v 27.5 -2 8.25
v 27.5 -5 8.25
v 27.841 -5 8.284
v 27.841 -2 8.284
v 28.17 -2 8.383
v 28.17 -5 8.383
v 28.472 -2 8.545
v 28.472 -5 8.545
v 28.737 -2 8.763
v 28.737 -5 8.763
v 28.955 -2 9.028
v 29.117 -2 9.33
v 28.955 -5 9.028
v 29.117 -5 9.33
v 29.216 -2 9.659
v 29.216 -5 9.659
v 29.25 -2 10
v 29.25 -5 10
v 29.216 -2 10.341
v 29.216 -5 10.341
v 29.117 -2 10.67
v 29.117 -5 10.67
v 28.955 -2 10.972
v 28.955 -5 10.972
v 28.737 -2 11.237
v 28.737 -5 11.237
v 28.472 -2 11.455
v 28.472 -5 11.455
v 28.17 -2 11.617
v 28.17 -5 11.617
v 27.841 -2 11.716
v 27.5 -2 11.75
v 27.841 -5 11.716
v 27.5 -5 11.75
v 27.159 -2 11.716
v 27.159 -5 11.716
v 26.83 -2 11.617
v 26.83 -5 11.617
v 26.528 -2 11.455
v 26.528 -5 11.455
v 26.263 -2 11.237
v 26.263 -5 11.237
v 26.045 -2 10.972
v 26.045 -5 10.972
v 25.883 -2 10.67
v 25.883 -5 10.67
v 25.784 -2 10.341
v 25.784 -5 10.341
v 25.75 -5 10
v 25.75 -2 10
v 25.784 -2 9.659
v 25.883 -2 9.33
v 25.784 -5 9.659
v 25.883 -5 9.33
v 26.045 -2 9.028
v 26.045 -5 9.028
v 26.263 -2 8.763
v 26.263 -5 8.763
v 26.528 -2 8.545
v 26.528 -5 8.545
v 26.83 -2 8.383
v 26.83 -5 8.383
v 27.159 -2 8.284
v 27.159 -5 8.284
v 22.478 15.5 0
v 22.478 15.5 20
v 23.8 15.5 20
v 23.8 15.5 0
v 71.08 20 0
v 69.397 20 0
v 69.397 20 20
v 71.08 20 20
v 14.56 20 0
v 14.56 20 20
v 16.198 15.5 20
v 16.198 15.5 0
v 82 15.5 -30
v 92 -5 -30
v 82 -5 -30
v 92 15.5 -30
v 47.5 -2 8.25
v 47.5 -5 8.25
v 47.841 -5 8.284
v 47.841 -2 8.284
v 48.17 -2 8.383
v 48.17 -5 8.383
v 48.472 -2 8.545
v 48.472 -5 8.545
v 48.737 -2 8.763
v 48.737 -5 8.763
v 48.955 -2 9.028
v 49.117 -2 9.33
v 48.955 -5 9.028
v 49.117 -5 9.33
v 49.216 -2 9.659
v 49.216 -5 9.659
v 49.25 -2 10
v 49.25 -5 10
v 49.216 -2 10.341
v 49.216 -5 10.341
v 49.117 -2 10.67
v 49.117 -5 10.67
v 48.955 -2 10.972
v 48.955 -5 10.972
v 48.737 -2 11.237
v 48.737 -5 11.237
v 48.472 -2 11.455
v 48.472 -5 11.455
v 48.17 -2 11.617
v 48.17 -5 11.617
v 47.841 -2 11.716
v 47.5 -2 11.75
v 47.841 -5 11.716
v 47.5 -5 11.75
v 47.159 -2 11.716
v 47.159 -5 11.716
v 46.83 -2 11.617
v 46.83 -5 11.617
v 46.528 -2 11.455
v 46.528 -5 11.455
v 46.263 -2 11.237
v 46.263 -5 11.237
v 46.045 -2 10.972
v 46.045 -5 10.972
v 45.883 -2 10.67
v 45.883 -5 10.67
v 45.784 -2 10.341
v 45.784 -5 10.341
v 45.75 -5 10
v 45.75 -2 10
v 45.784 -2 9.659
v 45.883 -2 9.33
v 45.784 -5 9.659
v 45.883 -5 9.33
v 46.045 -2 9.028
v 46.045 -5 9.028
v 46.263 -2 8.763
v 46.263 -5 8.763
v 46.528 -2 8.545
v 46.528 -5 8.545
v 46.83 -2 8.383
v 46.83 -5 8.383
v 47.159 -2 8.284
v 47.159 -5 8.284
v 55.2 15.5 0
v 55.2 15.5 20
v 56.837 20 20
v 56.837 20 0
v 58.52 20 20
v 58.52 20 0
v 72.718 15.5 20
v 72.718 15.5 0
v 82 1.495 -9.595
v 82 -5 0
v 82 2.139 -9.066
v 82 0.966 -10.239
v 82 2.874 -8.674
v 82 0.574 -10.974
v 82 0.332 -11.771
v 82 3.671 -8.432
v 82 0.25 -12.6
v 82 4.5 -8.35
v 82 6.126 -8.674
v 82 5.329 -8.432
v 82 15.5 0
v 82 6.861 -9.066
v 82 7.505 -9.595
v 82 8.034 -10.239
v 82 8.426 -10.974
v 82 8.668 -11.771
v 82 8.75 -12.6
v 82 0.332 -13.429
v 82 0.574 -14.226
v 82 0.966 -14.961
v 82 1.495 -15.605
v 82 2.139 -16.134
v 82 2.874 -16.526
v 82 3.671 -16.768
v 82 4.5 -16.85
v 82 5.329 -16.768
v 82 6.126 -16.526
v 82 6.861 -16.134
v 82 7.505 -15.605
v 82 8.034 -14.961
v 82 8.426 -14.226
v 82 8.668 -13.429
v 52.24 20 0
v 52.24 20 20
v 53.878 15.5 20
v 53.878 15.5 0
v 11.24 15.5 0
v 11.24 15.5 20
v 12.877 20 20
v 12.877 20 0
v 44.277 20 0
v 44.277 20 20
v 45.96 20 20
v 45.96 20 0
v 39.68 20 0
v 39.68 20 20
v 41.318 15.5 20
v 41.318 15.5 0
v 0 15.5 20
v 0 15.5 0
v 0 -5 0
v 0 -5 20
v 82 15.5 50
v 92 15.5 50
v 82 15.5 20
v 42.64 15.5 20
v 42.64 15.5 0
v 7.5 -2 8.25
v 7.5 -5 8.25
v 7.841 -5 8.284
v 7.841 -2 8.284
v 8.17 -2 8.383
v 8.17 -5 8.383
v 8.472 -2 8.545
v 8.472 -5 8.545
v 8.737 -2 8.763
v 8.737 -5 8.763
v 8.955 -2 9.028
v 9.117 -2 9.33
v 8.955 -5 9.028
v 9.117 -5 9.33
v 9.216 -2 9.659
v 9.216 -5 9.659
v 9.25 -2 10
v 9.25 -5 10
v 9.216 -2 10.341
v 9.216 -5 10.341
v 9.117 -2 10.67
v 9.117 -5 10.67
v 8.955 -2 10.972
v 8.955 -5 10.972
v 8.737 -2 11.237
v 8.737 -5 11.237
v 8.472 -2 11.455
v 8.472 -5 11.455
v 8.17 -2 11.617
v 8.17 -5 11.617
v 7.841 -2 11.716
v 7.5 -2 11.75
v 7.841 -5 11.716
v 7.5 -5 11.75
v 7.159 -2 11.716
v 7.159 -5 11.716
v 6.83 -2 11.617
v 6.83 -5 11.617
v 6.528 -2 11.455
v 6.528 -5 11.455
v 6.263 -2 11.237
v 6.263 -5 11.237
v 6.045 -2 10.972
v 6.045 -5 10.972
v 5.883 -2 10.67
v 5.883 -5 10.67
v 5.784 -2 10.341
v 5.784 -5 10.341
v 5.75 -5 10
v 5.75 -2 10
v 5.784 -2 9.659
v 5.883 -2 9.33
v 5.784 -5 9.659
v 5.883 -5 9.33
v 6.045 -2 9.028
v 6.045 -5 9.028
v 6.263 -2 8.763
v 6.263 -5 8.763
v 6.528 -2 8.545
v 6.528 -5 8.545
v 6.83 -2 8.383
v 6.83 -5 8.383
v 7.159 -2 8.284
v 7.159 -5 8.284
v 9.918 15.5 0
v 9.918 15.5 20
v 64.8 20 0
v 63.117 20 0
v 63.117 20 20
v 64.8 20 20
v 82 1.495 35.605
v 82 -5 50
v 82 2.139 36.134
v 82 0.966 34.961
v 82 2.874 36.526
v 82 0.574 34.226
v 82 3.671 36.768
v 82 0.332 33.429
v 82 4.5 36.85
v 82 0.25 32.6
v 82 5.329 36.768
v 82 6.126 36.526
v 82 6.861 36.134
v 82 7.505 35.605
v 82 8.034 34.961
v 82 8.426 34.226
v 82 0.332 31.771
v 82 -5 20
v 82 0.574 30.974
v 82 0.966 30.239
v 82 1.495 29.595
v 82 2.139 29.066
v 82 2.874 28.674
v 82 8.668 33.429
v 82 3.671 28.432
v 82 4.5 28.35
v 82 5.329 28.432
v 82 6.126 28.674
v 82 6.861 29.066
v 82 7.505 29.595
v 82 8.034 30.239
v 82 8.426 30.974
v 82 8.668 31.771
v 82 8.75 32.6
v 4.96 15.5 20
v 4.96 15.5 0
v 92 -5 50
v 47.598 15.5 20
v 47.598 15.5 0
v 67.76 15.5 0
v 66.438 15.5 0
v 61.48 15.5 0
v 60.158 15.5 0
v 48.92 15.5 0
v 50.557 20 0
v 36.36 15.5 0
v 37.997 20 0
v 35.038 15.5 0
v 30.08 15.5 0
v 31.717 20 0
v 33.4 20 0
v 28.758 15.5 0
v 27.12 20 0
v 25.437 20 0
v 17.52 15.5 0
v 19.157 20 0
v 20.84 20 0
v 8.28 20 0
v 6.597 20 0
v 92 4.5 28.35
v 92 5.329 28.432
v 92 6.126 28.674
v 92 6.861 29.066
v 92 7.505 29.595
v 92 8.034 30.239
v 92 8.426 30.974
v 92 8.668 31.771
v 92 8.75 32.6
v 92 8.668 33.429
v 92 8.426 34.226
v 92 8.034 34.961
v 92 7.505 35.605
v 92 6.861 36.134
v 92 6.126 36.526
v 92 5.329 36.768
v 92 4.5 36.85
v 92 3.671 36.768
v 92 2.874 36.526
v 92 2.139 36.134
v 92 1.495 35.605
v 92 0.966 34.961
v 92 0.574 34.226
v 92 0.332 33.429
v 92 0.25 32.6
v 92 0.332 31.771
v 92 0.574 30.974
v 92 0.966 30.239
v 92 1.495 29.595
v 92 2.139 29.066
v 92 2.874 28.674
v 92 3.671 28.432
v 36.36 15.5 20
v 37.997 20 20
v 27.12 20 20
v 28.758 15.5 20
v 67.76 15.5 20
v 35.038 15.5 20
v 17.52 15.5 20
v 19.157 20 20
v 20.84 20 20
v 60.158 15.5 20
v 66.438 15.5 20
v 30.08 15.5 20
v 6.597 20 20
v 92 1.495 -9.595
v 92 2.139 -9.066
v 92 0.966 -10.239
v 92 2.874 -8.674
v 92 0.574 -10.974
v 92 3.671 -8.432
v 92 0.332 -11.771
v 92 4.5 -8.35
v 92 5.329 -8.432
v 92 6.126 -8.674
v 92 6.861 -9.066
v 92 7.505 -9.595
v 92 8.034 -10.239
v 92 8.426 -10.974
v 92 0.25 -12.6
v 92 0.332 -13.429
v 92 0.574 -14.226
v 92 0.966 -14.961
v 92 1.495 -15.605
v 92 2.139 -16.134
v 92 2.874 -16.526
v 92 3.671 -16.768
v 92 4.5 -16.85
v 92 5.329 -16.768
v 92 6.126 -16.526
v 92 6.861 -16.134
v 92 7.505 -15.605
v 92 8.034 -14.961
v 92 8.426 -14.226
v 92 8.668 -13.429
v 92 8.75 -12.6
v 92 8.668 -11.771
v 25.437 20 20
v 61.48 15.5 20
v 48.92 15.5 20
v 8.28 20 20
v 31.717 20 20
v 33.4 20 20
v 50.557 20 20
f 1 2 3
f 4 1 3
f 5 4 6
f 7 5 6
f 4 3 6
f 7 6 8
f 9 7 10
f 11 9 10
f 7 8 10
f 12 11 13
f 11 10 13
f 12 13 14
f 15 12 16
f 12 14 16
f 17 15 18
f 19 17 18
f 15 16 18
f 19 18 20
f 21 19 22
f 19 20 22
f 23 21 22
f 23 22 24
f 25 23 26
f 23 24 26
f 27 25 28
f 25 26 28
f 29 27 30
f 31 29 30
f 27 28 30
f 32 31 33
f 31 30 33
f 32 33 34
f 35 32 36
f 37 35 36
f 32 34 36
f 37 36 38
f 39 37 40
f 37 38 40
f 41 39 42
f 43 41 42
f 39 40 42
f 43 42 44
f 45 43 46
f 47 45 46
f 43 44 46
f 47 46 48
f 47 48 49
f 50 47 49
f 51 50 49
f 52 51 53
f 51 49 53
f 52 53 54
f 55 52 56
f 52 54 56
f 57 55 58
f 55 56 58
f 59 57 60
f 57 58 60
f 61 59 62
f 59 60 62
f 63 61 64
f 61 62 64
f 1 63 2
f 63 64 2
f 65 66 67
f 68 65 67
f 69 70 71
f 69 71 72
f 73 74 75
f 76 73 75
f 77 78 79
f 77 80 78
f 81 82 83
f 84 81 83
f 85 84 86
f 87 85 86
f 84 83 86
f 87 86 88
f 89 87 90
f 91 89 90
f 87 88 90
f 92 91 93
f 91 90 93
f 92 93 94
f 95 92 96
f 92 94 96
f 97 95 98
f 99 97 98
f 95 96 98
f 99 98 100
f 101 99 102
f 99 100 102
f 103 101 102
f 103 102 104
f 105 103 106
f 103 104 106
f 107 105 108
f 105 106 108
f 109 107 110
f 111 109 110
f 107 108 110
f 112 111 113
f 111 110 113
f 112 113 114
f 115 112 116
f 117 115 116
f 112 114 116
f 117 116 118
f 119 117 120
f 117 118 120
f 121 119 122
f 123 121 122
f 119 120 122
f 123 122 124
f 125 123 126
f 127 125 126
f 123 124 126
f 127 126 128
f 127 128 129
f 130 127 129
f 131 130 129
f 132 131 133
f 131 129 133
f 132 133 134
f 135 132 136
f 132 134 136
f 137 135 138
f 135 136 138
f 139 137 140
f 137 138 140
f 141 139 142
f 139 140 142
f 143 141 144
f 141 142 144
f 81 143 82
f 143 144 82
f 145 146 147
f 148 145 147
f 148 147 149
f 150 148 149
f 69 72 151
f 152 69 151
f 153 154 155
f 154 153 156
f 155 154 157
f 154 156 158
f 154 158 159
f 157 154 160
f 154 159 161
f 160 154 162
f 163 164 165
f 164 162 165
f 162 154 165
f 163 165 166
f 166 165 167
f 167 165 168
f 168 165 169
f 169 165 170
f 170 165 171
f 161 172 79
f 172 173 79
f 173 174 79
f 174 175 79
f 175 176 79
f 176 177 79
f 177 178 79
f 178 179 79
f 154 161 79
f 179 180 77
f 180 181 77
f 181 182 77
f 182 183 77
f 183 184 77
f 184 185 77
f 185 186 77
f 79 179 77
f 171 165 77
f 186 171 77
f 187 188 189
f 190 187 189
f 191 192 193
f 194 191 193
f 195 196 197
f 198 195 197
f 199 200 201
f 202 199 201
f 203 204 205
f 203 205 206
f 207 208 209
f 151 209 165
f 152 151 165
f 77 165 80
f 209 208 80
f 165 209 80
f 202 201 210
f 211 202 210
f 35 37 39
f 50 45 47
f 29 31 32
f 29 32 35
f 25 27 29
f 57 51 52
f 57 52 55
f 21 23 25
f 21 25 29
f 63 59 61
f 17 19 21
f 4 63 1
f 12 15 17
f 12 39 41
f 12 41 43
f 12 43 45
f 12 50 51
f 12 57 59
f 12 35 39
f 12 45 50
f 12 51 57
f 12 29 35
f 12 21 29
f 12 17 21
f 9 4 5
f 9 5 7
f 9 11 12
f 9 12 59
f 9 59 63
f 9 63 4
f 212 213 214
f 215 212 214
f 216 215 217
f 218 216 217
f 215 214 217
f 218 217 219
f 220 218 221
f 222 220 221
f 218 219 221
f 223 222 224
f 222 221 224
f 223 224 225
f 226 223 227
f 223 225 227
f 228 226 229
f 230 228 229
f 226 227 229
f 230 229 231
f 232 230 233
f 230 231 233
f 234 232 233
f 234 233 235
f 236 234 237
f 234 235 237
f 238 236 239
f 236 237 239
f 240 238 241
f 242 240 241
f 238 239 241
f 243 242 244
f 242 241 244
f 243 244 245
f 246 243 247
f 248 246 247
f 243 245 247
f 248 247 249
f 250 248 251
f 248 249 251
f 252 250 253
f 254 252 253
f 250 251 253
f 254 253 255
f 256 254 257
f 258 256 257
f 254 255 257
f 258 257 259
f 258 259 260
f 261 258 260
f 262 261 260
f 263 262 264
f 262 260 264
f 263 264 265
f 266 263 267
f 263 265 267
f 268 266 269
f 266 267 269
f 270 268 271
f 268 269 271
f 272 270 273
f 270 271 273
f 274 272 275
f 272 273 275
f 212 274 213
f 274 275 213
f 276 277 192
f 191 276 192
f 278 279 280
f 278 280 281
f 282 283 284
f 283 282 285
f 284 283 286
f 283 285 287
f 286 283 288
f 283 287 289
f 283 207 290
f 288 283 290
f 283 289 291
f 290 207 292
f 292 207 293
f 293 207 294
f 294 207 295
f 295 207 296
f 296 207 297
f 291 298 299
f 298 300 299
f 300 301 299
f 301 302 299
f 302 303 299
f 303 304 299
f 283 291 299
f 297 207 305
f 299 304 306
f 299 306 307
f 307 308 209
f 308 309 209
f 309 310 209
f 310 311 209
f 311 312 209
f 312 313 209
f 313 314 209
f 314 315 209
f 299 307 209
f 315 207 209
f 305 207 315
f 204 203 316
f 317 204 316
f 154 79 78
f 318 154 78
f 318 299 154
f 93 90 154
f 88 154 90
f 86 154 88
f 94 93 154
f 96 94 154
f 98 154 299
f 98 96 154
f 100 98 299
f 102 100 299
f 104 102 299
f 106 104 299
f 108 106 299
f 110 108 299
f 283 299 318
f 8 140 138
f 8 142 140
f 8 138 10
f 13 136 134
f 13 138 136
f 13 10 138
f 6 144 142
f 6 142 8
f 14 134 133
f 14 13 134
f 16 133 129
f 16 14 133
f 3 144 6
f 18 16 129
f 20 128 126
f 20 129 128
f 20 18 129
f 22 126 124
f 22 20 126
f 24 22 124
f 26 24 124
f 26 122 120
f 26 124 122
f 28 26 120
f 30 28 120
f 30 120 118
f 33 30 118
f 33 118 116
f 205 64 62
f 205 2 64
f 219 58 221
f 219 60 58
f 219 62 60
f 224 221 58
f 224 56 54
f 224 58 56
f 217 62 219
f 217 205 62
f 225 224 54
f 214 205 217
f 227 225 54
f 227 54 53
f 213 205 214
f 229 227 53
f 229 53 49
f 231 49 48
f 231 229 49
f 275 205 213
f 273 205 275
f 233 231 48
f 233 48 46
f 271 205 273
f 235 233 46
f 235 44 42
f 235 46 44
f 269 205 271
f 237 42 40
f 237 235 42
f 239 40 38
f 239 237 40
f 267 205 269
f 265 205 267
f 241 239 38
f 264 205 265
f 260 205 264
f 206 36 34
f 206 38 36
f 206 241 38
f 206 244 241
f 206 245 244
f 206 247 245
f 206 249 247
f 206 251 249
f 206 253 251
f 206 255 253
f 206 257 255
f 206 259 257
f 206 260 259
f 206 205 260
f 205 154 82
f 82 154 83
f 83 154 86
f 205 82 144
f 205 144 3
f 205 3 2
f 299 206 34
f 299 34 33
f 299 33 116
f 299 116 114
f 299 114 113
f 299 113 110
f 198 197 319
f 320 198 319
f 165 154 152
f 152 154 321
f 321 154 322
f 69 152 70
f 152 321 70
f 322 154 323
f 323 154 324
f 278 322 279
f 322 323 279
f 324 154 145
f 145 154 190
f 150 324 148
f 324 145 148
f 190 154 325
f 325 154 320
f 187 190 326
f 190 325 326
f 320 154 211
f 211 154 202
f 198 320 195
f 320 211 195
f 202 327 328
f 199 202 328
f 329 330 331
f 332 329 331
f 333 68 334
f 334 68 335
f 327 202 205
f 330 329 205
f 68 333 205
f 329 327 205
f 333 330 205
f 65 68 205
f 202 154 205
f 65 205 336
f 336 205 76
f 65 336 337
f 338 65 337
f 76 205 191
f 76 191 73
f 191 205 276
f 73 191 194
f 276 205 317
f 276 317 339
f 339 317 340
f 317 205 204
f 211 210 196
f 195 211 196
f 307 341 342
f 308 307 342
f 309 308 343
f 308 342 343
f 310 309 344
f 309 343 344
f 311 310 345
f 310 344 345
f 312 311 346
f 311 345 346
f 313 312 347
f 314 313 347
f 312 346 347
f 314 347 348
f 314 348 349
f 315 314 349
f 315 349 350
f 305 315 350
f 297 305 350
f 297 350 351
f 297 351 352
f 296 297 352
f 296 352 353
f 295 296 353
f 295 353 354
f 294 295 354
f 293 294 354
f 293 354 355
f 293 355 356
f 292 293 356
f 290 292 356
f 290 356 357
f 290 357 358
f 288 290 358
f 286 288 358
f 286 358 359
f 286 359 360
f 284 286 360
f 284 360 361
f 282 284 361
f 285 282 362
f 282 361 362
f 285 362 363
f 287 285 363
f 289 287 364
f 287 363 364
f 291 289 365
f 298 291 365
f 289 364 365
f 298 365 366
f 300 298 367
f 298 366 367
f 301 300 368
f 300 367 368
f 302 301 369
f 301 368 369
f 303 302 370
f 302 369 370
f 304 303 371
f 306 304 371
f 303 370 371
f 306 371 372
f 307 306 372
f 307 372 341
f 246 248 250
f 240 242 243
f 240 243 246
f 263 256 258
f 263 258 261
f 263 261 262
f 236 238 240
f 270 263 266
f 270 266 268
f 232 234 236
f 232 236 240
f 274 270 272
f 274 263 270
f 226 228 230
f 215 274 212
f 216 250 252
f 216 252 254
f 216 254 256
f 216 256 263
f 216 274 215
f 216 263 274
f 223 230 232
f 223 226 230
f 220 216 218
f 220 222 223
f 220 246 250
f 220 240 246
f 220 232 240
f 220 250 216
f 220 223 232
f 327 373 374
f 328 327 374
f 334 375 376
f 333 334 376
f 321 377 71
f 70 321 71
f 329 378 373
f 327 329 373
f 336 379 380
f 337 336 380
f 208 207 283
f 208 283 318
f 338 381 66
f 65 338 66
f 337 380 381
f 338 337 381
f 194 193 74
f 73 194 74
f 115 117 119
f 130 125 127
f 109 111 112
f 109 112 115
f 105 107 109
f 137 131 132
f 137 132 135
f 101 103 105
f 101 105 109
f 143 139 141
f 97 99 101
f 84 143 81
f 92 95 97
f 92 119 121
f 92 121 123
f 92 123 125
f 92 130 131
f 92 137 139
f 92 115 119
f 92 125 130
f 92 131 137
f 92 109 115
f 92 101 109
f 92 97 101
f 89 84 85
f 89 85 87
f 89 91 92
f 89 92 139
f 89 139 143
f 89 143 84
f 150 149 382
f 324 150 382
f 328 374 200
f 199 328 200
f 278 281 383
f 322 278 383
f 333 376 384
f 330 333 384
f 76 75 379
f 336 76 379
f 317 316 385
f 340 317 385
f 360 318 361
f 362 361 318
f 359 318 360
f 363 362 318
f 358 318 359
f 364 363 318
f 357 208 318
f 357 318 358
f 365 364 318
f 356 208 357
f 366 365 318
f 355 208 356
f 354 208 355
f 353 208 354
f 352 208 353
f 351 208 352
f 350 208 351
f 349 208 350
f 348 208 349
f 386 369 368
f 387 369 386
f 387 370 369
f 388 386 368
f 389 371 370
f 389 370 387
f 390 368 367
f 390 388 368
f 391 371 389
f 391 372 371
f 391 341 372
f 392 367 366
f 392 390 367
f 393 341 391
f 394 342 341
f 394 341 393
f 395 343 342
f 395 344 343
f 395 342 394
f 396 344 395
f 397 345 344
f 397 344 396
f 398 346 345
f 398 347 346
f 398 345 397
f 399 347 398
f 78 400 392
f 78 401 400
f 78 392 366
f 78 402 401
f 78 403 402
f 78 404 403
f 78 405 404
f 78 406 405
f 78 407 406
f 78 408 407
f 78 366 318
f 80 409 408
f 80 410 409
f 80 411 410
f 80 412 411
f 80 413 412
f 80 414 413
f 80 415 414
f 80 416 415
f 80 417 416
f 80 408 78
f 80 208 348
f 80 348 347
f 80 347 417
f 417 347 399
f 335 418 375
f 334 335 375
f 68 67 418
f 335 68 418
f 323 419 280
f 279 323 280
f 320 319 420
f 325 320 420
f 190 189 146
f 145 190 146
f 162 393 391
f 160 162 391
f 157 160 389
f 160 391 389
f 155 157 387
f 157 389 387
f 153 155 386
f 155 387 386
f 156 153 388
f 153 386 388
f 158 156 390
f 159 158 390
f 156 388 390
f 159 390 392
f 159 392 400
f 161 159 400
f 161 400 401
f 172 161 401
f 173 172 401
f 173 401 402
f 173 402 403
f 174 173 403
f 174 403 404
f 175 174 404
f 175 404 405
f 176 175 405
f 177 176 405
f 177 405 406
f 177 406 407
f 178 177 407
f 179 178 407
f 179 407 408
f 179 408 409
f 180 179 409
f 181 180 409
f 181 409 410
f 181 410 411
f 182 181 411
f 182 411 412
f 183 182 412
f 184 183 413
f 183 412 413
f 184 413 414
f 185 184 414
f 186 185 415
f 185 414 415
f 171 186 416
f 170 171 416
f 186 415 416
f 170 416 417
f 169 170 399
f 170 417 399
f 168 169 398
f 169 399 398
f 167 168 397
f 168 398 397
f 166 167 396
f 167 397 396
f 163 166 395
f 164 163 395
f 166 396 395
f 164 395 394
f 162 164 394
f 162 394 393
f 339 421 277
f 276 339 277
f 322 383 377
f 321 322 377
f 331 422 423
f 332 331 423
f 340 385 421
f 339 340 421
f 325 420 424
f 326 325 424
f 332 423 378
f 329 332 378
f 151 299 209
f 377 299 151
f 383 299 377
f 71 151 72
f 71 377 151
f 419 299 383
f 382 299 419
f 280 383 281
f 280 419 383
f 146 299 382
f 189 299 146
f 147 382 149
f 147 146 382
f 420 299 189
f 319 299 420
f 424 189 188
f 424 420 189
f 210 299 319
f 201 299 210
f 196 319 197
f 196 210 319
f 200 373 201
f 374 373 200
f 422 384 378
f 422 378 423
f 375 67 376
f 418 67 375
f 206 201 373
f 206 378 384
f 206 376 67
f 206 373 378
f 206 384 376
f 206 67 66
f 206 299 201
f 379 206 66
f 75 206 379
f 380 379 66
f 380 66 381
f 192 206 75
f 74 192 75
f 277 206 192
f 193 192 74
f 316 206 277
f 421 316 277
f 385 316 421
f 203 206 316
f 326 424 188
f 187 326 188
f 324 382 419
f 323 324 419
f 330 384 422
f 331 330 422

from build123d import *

# Parameters (mm, degrees)
SKETCH_1_W             = 92
SKETCH_1_H             = 20
EXTRUDE_1_DEPTH        = 20
CUT_EXTRUDE_1_DEPTH    = 97.249675324
PATTERN_LINEAR_1_COUNT = 14
PATTERN_LINEAR_1_PITCH = 6.28
CUT_EXTRUDE_2_DEPTH    = 97.249675324
SKETCH_4_W             = 30
SKETCH_4_H             = 15.5
EXTRUDE_2_DEPTH        = 10
EXTRUDE_3_DEPTH        = 5
SKETCH_9_R             = 4.25
CUT_EXTRUDE_6_DEPTH    = 107.60206377
SKETCH_11_W            = 20
SKETCH_11_H            = 5
EXTRUDE_4_DEPTH        = 82
SKETCH_12_R            = 1.75
CUT_EXTRUDE_7_DEPTH    = 3


with BuildPart() as part:
    # 草图1 → 凸台-拉伸1 (new body)
    with BuildSketch(Plane.XY):
        with Locations((46, 10)):
            Rectangle(SKETCH_1_W, SKETCH_1_H)
    extrude(amount=EXTRUDE_1_DEPTH)

    # 草图2 → 切除-拉伸1 (cut, through all)
    with BuildSketch(Plane.XY.offset(20)):
        Polygon((2, 20), (3.637866054, 15.5), (4.959614883, 15.5), (6.597480937, 20), align=None)
    cut_extrude_1 = extrude(amount=-CUT_EXTRUDE_1_DEPTH, mode=Mode.SUBTRACT)

    # 阵列(线性)1: 切除-拉伸1 ×14
    with Locations(*[(i * PATTERN_LINEAR_1_PITCH, 0, 0) for i in range(1, PATTERN_LINEAR_1_COUNT)]):
        add(cut_extrude_1, mode=Mode.SUBTRACT)

    # 草图3 → 切除-拉伸2 (cut, through all)
    with BuildSketch(Plane.XY.offset(20)):
        Polygon((2, 20), (0, 20), (0, 15.5), (3.637866054, 15.5), align=None)
        Polygon((74.039614883, 15.5), (75.677480937, 20), (92, 20), (92, 15.5), align=None)
    extrude(amount=-CUT_EXTRUDE_2_DEPTH, mode=Mode.SUBTRACT)

    # 草图4 → 凸台-拉伸2 (add)
    with BuildSketch(Plane(origin=(92, 0, 0), x_dir=(0, 0, -1), z_dir=(1, 0, 0))):
        with Locations((-35, 7.75)):
            Rectangle(SKETCH_4_W, SKETCH_4_H)
        with Locations((15, 7.75)):
            Rectangle(SKETCH_4_W, SKETCH_4_H)
    extrude(amount=-EXTRUDE_2_DEPTH)

    # 草图6 → 凸台-拉伸3 (add)
    with BuildSketch(Plane.XZ):
        Polygon((82, 0), (82, 20), (82, 50), (92, 50), (92, -30), (82, -30), align=None)
    extrude(amount=EXTRUDE_3_DEPTH)

    # 草图9 → 切除-拉伸6 (cut, through all)
    with BuildSketch(Plane(origin=(92, 0, 0), x_dir=(0, 0, -1), z_dir=(1, 0, 0))):
        with Locations((-32.6, 4.5)):
            Circle(SKETCH_9_R)
        with Locations(Location((12.6, 4.5, 0), (0, 0, 180))):
            Circle(SKETCH_9_R)
    extrude(amount=-CUT_EXTRUDE_6_DEPTH, mode=Mode.SUBTRACT)

    # 草图11 → 凸台-拉伸4 (add)
    with BuildSketch(Plane.ZY):
        with Locations((10, -2.5)):
            Rectangle(SKETCH_11_W, SKETCH_11_H)
    extrude(amount=-EXTRUDE_4_DEPTH)

    # 草图12 → 切除-拉伸7 (cut)
    with BuildSketch(Plane.XZ.offset(5)):
        with Locations(Location((7.5, 10, 0), (0, 0, 270))):
            Circle(SKETCH_12_R)
        with Locations(Location((27.5, 10, 0), (0, 0, 270))):
            Circle(SKETCH_12_R)
        with Locations(Location((47.5, 10, 0), (0, 0, 270))):
            Circle(SKETCH_12_R)
    extrude(amount=-CUT_EXTRUDE_7_DEPTH, mode=Mode.SUBTRACT)


solid = part.part
